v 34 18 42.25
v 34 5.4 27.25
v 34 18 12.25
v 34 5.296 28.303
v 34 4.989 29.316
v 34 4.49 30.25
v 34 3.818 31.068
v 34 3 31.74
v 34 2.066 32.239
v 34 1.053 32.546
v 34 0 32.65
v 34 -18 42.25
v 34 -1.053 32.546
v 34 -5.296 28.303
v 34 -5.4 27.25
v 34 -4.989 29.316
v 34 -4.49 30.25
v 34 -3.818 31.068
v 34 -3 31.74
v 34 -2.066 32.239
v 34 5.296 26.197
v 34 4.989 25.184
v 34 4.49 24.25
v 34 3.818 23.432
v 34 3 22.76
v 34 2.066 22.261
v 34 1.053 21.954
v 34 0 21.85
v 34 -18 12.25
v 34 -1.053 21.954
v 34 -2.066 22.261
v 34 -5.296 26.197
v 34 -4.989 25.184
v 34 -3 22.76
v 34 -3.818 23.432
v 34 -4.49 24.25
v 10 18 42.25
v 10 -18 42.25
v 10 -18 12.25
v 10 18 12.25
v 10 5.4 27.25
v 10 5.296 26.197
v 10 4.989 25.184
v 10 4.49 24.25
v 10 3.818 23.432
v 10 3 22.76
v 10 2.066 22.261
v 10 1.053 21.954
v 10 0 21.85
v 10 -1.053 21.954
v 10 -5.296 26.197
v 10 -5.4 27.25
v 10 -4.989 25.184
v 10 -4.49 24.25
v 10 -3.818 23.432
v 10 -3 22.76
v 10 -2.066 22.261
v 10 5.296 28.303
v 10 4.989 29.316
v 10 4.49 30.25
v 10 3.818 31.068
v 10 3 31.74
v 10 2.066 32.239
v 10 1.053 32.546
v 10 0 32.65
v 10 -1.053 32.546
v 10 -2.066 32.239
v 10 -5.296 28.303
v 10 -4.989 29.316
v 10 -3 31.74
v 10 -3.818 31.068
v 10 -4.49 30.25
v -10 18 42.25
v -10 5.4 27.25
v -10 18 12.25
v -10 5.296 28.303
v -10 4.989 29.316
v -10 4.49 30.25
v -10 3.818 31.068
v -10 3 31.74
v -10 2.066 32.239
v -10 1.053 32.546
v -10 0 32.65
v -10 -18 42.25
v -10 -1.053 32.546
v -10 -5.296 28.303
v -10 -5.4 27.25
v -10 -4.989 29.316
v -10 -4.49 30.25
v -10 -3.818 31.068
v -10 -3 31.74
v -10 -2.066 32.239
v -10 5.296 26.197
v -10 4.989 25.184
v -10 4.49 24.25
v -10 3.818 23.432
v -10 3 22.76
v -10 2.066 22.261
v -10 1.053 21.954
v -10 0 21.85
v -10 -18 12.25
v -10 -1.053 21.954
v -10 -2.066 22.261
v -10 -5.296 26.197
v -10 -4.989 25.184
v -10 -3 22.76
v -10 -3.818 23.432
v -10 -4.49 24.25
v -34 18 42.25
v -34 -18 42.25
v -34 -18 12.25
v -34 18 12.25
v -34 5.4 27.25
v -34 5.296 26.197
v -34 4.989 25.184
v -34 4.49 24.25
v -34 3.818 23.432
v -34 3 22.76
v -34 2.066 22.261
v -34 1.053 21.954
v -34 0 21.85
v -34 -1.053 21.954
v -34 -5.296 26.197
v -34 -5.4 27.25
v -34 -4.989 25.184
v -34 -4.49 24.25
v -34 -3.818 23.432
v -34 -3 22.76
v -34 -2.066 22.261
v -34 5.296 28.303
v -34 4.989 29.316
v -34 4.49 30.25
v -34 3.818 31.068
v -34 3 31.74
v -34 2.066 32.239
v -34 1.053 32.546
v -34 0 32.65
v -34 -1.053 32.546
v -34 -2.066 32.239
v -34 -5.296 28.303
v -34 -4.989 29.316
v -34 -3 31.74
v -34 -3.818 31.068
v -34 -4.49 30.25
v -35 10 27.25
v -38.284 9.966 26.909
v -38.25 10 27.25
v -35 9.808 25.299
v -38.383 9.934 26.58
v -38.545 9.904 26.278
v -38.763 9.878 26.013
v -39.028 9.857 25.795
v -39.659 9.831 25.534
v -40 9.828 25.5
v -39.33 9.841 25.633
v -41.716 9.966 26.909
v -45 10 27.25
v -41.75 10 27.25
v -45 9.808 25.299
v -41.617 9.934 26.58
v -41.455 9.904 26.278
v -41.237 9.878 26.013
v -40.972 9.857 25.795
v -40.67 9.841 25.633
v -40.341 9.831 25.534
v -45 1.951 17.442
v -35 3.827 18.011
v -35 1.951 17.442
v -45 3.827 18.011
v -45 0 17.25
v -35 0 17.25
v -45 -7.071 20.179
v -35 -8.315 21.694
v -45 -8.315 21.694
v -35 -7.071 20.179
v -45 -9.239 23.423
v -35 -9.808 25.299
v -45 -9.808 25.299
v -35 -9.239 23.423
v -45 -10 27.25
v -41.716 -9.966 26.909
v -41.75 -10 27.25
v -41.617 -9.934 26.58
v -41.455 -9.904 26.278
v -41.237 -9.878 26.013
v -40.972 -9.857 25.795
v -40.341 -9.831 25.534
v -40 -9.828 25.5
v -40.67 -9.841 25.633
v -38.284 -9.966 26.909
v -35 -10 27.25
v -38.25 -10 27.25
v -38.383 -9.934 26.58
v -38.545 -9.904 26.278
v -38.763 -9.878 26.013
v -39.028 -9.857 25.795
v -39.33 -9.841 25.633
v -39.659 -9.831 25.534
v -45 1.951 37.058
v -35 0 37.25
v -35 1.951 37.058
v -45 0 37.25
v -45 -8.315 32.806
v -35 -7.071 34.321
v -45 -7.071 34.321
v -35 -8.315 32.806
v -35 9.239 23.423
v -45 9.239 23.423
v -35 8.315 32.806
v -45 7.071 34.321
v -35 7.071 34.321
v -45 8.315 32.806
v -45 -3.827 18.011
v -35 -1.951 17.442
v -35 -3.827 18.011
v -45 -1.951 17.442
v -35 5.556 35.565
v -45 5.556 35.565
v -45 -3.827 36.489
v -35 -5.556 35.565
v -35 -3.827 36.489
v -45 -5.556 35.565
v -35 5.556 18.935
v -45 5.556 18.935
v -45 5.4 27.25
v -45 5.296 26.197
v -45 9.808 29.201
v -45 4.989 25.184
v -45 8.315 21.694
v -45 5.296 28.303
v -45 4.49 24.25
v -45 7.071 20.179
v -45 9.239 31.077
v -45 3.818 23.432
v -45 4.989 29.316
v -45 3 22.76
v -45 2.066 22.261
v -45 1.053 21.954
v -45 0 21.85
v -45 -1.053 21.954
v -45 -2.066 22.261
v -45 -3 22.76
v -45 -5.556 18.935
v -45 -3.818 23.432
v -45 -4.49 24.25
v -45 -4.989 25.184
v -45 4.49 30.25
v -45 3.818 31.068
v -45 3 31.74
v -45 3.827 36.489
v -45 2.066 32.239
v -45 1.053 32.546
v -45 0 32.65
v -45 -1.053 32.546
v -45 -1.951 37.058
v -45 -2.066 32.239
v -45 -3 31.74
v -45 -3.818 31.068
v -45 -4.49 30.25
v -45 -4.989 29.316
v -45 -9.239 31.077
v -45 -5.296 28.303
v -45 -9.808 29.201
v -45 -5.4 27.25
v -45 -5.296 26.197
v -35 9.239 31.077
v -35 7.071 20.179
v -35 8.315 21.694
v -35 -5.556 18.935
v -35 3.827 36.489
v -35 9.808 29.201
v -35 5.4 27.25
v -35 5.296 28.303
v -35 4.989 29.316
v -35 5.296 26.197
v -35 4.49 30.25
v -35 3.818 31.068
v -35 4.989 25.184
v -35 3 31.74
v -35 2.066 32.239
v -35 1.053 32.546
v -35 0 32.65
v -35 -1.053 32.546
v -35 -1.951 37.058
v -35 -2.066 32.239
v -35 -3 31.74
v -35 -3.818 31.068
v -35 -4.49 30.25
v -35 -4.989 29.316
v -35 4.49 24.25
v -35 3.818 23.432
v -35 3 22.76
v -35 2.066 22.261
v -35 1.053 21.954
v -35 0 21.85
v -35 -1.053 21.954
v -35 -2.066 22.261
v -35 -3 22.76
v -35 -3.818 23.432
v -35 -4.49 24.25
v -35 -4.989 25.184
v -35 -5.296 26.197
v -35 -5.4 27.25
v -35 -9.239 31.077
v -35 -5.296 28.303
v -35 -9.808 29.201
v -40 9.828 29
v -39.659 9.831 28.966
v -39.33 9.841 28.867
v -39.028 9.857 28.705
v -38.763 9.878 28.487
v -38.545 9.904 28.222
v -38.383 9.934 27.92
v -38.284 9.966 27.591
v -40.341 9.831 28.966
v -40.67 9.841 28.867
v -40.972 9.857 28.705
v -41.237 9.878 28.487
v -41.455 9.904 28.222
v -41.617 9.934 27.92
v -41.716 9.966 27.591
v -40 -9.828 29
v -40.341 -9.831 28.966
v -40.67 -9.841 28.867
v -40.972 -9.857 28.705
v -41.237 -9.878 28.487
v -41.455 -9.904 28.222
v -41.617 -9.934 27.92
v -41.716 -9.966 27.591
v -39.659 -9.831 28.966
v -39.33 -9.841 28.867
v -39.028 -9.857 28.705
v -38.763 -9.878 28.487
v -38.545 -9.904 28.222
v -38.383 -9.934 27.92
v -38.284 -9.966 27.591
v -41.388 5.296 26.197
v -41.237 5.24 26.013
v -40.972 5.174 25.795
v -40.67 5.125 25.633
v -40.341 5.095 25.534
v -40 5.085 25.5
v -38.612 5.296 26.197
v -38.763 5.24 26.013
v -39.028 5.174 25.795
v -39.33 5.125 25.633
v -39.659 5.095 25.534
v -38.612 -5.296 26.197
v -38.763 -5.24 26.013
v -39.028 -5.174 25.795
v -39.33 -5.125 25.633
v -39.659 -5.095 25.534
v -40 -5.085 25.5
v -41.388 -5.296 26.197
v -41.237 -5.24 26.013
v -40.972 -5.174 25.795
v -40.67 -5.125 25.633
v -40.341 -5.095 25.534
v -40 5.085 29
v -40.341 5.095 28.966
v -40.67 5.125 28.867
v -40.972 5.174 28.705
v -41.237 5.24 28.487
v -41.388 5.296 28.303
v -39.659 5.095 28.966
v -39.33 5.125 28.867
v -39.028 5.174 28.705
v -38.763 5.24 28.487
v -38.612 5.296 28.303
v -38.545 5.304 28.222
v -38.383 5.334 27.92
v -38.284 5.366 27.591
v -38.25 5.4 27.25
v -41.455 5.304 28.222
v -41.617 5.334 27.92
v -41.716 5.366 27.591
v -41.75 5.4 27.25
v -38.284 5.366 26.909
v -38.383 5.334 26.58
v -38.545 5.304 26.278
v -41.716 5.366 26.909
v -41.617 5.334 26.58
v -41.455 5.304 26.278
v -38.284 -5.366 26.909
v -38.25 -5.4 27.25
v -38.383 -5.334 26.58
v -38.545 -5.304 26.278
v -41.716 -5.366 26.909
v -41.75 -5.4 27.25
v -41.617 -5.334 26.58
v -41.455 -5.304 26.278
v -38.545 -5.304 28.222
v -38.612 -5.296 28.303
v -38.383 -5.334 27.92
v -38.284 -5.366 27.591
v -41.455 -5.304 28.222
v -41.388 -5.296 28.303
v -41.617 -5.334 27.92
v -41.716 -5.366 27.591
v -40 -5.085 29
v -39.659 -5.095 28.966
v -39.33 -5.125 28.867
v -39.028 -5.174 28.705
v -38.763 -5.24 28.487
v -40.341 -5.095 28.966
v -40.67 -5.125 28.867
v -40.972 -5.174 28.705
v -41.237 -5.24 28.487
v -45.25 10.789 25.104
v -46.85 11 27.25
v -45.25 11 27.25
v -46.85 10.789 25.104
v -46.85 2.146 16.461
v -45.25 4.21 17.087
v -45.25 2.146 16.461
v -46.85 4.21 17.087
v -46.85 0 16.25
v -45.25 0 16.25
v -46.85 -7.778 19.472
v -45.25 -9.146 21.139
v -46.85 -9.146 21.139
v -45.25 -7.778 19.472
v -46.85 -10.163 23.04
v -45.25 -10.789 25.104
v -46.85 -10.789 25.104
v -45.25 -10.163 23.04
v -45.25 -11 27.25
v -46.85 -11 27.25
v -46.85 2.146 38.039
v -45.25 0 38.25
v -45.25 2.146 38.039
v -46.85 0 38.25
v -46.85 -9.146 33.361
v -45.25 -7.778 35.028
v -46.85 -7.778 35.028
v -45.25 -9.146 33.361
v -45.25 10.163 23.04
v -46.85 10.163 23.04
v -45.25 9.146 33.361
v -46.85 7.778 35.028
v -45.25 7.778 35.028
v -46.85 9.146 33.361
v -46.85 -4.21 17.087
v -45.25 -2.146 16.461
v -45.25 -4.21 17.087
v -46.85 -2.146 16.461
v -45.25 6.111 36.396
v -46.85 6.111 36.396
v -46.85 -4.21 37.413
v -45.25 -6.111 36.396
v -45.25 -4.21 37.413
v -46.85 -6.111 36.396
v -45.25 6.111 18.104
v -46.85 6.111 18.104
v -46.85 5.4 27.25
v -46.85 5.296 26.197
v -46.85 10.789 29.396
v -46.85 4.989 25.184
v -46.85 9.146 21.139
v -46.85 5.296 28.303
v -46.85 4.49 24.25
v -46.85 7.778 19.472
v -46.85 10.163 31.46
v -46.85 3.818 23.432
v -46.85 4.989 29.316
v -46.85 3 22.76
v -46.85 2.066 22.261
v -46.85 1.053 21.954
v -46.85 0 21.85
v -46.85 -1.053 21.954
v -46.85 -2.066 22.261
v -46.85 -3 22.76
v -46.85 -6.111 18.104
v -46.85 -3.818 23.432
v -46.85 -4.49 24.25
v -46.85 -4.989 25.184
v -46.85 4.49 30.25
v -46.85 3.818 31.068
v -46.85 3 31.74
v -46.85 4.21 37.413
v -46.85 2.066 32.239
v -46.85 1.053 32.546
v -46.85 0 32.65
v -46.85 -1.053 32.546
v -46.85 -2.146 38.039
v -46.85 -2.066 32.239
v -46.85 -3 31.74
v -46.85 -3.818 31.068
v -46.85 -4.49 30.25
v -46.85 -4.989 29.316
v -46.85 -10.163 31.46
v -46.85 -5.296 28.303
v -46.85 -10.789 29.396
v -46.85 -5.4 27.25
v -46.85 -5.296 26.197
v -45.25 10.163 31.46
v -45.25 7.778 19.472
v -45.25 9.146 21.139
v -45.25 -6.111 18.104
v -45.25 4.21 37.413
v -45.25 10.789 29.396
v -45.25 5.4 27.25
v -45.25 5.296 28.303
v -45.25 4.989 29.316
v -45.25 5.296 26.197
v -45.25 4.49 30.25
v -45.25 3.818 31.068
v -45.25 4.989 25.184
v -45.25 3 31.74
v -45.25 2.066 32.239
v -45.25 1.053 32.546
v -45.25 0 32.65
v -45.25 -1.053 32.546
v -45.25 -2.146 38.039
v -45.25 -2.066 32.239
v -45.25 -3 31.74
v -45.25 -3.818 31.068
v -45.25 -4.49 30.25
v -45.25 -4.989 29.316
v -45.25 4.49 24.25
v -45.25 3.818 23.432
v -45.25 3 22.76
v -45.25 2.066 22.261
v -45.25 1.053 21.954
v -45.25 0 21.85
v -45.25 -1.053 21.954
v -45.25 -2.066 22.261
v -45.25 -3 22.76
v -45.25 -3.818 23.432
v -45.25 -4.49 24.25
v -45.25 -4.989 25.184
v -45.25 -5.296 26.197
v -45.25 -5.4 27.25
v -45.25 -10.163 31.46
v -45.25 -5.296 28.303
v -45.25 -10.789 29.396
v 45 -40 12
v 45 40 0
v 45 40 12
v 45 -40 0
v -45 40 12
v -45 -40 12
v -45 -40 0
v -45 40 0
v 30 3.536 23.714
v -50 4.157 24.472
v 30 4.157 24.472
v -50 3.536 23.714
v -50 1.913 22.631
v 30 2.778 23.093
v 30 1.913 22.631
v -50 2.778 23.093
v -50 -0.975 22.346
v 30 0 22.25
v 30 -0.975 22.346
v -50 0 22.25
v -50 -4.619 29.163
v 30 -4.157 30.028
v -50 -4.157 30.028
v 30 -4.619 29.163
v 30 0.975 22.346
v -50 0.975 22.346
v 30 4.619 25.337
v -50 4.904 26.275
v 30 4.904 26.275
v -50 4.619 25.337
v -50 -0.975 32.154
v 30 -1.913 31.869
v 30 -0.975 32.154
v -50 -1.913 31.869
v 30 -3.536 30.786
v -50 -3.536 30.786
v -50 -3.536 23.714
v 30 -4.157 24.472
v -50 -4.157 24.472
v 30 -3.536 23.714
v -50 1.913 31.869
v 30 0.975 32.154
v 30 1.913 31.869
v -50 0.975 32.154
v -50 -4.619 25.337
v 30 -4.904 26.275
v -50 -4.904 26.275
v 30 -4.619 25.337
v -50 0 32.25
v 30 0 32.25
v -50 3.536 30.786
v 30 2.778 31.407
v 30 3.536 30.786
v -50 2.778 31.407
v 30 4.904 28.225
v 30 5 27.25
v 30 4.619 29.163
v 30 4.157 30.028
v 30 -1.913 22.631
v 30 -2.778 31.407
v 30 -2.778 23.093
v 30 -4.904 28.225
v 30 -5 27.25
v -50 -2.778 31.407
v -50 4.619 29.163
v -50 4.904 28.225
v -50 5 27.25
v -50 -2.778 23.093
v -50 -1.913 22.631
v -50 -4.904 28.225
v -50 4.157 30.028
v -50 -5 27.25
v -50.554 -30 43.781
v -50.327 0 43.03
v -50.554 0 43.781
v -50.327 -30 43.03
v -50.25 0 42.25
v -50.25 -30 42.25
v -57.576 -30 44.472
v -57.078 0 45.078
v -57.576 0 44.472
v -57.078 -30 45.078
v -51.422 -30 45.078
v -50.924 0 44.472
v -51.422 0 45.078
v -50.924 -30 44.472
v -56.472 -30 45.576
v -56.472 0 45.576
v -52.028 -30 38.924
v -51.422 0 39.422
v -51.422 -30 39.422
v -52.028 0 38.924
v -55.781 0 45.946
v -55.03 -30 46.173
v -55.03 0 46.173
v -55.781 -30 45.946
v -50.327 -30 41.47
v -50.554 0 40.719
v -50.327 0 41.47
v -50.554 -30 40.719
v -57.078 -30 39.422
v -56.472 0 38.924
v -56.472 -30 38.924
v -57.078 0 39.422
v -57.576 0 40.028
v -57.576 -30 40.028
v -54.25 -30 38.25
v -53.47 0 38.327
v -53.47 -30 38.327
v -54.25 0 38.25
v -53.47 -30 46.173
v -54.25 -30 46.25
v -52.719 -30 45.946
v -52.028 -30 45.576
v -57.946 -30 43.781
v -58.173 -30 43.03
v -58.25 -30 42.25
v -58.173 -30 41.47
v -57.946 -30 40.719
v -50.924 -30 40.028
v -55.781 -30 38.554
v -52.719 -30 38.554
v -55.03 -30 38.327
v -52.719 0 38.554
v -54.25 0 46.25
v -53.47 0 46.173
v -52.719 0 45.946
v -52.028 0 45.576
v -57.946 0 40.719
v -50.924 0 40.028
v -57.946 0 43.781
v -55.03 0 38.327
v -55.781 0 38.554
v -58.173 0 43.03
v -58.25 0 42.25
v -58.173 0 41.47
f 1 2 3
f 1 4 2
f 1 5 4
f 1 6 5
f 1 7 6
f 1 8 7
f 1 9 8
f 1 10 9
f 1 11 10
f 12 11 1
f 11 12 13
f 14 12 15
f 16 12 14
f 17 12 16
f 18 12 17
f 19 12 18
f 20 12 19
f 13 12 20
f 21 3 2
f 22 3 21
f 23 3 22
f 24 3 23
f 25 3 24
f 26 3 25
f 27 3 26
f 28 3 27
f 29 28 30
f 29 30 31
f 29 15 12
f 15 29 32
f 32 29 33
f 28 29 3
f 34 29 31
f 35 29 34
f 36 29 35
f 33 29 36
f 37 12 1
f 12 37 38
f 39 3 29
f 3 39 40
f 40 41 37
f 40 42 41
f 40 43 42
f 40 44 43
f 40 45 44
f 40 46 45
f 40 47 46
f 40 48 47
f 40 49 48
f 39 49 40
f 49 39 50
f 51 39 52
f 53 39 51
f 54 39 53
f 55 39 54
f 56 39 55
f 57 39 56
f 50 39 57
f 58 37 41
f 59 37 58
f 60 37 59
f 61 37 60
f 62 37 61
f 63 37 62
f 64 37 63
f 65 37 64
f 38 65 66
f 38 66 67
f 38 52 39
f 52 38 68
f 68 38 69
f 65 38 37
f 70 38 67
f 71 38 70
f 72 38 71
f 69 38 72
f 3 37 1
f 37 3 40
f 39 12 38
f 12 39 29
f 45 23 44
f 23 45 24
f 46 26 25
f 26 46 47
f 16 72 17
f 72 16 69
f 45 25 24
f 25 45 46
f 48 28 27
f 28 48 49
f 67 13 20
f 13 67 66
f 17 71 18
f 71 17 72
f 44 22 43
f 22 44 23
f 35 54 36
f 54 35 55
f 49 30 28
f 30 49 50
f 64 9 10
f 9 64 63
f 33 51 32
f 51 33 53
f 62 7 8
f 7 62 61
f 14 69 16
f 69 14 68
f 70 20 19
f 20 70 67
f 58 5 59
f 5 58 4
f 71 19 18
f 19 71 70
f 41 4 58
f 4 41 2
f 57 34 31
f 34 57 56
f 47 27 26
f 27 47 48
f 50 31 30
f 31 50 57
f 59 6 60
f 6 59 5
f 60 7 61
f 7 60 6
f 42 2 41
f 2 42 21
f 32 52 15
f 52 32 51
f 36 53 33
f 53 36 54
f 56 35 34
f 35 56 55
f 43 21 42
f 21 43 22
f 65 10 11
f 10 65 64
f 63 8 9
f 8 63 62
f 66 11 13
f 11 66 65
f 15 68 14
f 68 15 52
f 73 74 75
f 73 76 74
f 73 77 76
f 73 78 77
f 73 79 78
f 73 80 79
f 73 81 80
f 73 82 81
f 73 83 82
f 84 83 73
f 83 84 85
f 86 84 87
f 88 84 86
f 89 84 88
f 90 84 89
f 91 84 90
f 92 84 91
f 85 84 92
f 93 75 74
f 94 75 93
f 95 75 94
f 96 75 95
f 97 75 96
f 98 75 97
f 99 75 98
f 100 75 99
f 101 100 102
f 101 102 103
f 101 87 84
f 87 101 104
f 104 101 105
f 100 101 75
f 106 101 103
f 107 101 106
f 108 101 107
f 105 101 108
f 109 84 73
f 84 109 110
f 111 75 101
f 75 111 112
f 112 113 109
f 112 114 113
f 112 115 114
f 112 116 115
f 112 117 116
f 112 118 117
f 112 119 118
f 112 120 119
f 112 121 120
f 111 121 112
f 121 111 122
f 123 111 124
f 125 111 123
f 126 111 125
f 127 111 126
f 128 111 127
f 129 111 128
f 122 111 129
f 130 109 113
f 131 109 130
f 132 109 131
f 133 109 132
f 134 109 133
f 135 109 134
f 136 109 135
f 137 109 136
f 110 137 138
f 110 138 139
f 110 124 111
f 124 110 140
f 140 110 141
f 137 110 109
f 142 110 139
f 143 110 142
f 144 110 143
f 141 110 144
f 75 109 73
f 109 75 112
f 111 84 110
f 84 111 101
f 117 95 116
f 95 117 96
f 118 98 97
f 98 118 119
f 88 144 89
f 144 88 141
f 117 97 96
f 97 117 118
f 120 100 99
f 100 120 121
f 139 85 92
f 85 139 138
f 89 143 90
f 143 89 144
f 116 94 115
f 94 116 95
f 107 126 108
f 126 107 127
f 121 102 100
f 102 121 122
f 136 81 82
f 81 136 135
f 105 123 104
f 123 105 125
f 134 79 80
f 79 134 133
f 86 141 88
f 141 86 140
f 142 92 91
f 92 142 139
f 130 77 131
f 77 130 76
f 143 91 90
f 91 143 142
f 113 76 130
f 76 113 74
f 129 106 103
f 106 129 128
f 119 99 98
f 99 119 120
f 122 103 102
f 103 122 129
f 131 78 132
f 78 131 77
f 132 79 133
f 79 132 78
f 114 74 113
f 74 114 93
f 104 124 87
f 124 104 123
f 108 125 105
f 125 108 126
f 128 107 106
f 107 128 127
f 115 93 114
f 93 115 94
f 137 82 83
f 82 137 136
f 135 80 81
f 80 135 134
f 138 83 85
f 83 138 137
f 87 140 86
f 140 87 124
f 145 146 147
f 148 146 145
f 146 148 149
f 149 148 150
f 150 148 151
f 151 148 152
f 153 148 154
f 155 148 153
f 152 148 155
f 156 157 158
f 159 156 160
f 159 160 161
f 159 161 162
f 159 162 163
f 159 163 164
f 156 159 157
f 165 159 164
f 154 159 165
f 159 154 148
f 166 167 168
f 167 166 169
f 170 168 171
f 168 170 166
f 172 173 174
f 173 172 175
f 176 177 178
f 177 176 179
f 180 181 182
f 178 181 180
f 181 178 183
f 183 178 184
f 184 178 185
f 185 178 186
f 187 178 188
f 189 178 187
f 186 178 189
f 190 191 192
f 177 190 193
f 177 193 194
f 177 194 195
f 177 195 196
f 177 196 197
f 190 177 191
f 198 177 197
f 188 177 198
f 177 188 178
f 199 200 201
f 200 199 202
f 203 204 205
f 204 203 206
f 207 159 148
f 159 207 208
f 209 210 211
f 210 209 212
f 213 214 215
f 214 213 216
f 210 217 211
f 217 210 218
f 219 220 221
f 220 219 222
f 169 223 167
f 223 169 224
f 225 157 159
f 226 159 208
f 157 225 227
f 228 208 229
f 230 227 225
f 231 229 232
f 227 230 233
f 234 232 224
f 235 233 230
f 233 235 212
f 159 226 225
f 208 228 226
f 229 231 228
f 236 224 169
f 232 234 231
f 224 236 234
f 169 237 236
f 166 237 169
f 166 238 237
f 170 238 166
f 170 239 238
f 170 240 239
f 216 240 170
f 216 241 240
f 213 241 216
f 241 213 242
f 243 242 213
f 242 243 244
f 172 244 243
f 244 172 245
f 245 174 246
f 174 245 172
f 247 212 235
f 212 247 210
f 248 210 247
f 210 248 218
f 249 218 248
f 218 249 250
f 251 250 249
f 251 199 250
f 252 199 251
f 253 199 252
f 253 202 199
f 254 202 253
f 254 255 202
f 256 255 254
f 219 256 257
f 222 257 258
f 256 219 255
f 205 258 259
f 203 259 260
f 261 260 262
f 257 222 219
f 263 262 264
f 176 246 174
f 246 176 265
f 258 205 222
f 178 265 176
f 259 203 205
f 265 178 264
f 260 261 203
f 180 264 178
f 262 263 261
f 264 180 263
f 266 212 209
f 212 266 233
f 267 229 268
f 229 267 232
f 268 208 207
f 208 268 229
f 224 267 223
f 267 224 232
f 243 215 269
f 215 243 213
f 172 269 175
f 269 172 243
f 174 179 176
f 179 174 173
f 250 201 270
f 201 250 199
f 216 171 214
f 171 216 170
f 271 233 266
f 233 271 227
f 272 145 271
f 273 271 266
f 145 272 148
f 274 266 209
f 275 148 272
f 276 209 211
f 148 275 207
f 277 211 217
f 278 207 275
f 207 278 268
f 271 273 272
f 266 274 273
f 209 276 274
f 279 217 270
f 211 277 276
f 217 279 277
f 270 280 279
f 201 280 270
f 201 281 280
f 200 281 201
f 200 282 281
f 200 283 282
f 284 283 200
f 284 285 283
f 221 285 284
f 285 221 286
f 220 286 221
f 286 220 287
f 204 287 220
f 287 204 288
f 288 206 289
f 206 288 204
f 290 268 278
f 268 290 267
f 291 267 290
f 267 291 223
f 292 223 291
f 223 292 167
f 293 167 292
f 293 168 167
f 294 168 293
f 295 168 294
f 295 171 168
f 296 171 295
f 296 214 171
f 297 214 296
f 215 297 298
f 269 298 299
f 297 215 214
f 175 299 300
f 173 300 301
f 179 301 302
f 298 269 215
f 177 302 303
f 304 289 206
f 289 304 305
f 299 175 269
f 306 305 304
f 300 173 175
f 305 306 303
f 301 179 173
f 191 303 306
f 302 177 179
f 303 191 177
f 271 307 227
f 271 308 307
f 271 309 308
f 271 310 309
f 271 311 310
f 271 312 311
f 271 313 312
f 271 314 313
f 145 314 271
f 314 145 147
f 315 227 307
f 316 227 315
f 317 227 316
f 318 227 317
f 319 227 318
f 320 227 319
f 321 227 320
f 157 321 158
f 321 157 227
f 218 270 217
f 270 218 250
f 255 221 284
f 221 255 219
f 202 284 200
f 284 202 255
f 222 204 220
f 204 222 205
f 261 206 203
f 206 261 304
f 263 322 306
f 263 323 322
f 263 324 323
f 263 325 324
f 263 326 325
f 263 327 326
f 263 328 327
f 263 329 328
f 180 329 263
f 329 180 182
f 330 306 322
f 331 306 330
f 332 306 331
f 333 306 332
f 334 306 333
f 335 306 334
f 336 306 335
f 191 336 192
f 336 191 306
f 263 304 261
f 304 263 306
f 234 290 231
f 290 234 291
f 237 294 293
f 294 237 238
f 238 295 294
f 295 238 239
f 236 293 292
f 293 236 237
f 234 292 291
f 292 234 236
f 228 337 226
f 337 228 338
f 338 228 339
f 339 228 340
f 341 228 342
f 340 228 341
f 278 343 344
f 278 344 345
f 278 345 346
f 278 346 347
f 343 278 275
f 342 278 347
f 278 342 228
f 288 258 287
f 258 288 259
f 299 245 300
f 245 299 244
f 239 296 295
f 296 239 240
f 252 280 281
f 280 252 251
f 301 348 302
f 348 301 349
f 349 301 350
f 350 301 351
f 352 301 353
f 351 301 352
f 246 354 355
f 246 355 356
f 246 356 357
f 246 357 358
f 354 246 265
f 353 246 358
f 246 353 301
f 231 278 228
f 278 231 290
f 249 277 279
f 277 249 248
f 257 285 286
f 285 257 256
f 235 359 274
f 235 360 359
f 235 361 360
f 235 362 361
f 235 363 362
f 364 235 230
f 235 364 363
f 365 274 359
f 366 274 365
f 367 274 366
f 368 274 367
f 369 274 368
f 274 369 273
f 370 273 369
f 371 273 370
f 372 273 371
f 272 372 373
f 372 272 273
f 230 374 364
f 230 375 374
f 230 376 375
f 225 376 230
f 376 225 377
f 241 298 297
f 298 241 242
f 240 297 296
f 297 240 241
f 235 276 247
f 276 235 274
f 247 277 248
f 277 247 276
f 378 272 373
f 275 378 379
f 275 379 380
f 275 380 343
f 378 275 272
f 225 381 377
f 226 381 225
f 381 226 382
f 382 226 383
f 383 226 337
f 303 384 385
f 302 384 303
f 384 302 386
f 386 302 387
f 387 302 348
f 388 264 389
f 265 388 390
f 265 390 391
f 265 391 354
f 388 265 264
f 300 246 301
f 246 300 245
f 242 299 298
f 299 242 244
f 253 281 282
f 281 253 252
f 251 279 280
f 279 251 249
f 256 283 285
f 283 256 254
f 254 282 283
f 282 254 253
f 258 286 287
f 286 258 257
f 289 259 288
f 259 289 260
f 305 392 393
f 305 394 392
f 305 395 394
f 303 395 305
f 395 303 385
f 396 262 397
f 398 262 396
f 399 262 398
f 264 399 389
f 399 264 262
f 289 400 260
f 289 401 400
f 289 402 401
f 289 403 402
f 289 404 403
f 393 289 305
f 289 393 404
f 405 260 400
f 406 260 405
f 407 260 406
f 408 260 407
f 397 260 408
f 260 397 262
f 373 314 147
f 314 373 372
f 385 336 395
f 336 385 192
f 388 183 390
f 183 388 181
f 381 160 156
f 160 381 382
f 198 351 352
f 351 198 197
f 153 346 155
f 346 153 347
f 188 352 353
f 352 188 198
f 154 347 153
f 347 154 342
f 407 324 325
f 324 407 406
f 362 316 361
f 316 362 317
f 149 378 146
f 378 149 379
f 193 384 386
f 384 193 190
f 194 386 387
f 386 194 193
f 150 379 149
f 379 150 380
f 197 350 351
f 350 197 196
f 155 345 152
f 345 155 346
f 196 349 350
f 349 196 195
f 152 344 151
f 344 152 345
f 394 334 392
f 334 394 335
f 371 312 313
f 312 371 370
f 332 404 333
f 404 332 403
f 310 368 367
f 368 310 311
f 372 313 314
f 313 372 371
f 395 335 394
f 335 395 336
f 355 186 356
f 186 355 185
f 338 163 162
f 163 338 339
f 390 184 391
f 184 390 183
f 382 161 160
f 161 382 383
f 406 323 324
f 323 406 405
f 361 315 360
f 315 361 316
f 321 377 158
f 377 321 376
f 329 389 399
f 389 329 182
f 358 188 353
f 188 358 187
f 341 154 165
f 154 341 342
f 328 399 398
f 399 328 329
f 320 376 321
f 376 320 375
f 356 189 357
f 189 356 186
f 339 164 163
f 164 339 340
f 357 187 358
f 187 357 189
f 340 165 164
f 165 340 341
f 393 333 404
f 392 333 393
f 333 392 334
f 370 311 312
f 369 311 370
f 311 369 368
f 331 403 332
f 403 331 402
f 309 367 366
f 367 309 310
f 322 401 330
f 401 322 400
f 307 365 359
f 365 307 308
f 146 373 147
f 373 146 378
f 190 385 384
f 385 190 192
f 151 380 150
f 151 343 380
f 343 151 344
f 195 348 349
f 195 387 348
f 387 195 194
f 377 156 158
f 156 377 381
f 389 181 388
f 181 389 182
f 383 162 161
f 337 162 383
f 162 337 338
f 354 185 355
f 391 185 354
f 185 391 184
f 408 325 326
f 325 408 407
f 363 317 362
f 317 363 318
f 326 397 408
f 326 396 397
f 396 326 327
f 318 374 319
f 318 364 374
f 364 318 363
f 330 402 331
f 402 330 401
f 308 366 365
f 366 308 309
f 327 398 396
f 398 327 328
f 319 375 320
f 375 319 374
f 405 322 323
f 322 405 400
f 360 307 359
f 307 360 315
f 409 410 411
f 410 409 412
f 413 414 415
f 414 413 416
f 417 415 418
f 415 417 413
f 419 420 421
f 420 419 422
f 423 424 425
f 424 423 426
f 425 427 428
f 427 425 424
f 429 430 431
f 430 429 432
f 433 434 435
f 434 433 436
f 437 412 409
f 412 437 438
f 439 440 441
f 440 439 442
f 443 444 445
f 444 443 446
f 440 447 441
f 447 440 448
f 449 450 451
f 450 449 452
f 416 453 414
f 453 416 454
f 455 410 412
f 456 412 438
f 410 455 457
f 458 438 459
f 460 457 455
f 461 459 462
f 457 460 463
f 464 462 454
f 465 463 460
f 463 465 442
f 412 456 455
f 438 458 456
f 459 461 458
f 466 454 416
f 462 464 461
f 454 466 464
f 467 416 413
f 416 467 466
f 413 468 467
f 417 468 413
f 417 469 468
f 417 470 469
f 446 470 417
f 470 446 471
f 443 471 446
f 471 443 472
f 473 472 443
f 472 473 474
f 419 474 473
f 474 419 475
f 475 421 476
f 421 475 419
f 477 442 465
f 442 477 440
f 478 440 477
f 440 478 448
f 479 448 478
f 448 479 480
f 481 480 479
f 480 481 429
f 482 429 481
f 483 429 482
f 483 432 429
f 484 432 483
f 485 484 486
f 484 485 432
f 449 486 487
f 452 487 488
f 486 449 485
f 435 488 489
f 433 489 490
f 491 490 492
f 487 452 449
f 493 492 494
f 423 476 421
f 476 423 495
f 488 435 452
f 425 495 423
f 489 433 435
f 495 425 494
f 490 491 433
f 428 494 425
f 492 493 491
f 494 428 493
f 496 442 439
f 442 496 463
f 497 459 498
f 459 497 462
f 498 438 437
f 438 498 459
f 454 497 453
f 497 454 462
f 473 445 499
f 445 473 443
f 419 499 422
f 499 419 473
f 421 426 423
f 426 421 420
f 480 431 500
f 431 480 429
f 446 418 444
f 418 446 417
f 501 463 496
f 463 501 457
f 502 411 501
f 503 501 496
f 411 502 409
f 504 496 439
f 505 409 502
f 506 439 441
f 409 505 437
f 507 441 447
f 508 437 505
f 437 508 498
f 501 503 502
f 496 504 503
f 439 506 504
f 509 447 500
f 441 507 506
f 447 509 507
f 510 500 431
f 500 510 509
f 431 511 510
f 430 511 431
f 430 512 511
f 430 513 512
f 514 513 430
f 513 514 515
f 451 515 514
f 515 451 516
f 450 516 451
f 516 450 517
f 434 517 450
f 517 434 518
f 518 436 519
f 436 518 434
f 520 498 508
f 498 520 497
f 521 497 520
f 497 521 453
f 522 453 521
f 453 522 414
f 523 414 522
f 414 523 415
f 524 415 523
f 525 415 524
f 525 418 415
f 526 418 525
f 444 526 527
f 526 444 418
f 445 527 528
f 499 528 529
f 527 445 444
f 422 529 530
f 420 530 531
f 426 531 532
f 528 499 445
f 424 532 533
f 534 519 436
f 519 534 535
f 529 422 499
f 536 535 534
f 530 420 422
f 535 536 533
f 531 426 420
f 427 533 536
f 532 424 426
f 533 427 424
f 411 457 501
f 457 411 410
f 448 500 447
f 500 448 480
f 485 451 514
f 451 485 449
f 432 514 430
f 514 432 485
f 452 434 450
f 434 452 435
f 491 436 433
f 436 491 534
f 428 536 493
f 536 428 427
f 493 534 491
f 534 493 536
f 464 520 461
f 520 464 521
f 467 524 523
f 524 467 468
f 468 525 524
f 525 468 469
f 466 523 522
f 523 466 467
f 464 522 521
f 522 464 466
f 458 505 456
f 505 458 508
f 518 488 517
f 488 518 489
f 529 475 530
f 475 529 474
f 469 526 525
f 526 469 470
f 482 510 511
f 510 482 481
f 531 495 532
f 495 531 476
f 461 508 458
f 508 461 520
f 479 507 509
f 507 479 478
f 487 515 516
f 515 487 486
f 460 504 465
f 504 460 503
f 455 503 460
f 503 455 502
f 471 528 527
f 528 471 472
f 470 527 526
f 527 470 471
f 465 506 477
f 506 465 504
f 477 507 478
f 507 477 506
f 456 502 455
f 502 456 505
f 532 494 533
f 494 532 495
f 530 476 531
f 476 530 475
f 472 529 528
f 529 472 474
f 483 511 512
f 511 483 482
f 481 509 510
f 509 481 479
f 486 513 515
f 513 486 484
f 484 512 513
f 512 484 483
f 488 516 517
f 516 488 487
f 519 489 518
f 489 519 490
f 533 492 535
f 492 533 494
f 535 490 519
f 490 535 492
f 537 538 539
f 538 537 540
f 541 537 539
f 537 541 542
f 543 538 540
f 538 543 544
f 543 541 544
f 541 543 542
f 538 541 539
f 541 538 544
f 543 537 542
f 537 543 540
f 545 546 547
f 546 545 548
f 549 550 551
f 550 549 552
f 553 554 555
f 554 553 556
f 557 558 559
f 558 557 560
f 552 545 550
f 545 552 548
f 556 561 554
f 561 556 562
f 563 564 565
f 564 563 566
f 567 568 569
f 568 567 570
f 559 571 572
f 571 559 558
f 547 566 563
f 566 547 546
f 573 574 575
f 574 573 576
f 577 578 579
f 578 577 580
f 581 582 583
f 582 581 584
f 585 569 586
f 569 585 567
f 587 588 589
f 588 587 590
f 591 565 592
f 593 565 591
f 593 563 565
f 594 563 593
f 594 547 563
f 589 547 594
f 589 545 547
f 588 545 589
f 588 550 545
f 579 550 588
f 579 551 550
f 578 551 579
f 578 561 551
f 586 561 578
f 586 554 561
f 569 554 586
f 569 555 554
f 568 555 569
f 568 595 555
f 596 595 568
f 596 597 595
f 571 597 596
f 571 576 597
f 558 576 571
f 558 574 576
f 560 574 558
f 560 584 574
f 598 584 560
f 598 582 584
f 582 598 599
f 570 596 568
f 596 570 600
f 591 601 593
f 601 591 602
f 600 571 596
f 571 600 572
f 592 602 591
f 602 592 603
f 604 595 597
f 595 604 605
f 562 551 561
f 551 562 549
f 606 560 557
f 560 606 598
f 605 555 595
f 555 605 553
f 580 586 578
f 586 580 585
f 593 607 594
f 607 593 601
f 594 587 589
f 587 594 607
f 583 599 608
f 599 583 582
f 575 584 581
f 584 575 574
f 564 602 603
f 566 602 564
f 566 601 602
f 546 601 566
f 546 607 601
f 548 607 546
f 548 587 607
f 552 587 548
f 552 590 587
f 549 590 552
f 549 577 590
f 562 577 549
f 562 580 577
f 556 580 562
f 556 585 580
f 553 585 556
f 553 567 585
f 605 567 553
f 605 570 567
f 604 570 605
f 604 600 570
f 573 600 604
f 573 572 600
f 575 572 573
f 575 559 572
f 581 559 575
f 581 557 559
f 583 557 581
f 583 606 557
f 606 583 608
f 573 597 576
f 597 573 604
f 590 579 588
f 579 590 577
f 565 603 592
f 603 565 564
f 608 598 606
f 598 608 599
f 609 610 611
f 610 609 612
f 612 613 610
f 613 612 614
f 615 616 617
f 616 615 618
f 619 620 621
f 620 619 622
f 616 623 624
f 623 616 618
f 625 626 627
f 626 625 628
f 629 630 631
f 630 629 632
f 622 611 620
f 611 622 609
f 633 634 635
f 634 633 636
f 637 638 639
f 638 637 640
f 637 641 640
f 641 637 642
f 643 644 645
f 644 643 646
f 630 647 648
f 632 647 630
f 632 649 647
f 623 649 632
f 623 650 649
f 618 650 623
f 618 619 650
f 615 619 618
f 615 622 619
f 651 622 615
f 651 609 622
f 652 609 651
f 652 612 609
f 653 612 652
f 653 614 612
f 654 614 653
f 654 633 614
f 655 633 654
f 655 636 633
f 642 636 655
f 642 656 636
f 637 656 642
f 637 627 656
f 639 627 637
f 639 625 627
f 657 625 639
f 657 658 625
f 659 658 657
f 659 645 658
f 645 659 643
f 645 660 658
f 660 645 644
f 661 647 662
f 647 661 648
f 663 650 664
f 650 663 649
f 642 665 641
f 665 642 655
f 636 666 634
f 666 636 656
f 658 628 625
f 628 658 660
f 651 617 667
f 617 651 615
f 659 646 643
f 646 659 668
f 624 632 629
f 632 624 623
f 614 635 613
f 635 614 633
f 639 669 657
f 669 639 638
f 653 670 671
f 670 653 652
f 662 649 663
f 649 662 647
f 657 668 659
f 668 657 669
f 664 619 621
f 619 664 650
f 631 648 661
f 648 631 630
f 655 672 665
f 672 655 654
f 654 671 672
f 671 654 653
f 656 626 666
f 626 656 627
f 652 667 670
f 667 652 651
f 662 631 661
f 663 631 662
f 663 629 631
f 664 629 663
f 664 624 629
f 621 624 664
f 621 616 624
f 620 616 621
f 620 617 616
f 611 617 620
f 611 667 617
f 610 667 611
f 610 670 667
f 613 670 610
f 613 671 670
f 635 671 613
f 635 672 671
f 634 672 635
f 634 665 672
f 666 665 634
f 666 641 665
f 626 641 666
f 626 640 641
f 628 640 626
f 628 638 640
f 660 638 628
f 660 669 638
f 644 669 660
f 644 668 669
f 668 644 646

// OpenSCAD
$fn = 32;

// ------------------------------------------------------------------------
// Machine vise: screw d10, jaws 24 x 30 mm
// Every part is its own module, assembly() places every instance.
// ------------------------------------------------------------------------

// --- part 1 ---
module vise_bed() {
  difference() {
    translate([-45, -40, 0]) cube([90, 80, 12]);
  }
}

// --- part 2 ---
module vise_jaw() {
  difference() {
    translate([-12, -18, 0]) cube([24, 36, 30]);
    translate([0, 0, 15]) rotate([0, 90, 0]) cylinder(h = 26, d = 10.8, center = true);
  }
}

// --- part 3 ---
module vise_screw() {
  translate([0, 0, -40]) cylinder(h = 80, d = 10);
}

// --- part 4 ---
module screw_collar() {
  difference() {
    cylinder(h = 10, d = 20);
    translate([0, 0, -1]) cylinder(h = 12, d = 10.8);
    translate([0, 0, 5]) rotate([90, 0, 0]) cylinder(h = 22, d = 3.5, center = true);
  }
}

// --- part 5 ---
module screw_washer() {
  difference() {
      translate([0, 0, 0]) cylinder(h = 1.6, d = 22);
      translate([0, 0, -1]) cylinder(h = 3.6, d = 10.8);
    }
}

// --- part 6 ---
module vise_handle() {
  cylinder(h = 30, d = 8);
}

// --- assembly ---
module assembly() {
  color([0.80, 0.24, 0.20]) translate([0, 0, 0]) rotate([0, 0, 0]) vise_bed();
  color([0.20, 0.45, 0.75]) translate([22, 0, 12.25]) rotate([0, 0, 0]) vise_jaw();
  color([0.25, 0.62, 0.32]) translate([-22, 0, 12.25]) rotate([0, 0, 0]) vise_jaw();
  color([0.92, 0.70, 0.18]) translate([-10, 0, 27.25]) rotate([0, 90, 0]) vise_screw();
  color([0.58, 0.35, 0.70]) translate([-45, 0, 27.25]) rotate([0, 90, 0]) screw_collar();
  color([0.16, 0.66, 0.66]) translate([-46.85, 0, 27.25]) rotate([0, 90, 0]) screw_washer();
  color([0.85, 0.48, 0.18]) translate([-54.25, 0, 42.25]) rotate([90, 0, 0]) vise_handle();
}

assembly();
